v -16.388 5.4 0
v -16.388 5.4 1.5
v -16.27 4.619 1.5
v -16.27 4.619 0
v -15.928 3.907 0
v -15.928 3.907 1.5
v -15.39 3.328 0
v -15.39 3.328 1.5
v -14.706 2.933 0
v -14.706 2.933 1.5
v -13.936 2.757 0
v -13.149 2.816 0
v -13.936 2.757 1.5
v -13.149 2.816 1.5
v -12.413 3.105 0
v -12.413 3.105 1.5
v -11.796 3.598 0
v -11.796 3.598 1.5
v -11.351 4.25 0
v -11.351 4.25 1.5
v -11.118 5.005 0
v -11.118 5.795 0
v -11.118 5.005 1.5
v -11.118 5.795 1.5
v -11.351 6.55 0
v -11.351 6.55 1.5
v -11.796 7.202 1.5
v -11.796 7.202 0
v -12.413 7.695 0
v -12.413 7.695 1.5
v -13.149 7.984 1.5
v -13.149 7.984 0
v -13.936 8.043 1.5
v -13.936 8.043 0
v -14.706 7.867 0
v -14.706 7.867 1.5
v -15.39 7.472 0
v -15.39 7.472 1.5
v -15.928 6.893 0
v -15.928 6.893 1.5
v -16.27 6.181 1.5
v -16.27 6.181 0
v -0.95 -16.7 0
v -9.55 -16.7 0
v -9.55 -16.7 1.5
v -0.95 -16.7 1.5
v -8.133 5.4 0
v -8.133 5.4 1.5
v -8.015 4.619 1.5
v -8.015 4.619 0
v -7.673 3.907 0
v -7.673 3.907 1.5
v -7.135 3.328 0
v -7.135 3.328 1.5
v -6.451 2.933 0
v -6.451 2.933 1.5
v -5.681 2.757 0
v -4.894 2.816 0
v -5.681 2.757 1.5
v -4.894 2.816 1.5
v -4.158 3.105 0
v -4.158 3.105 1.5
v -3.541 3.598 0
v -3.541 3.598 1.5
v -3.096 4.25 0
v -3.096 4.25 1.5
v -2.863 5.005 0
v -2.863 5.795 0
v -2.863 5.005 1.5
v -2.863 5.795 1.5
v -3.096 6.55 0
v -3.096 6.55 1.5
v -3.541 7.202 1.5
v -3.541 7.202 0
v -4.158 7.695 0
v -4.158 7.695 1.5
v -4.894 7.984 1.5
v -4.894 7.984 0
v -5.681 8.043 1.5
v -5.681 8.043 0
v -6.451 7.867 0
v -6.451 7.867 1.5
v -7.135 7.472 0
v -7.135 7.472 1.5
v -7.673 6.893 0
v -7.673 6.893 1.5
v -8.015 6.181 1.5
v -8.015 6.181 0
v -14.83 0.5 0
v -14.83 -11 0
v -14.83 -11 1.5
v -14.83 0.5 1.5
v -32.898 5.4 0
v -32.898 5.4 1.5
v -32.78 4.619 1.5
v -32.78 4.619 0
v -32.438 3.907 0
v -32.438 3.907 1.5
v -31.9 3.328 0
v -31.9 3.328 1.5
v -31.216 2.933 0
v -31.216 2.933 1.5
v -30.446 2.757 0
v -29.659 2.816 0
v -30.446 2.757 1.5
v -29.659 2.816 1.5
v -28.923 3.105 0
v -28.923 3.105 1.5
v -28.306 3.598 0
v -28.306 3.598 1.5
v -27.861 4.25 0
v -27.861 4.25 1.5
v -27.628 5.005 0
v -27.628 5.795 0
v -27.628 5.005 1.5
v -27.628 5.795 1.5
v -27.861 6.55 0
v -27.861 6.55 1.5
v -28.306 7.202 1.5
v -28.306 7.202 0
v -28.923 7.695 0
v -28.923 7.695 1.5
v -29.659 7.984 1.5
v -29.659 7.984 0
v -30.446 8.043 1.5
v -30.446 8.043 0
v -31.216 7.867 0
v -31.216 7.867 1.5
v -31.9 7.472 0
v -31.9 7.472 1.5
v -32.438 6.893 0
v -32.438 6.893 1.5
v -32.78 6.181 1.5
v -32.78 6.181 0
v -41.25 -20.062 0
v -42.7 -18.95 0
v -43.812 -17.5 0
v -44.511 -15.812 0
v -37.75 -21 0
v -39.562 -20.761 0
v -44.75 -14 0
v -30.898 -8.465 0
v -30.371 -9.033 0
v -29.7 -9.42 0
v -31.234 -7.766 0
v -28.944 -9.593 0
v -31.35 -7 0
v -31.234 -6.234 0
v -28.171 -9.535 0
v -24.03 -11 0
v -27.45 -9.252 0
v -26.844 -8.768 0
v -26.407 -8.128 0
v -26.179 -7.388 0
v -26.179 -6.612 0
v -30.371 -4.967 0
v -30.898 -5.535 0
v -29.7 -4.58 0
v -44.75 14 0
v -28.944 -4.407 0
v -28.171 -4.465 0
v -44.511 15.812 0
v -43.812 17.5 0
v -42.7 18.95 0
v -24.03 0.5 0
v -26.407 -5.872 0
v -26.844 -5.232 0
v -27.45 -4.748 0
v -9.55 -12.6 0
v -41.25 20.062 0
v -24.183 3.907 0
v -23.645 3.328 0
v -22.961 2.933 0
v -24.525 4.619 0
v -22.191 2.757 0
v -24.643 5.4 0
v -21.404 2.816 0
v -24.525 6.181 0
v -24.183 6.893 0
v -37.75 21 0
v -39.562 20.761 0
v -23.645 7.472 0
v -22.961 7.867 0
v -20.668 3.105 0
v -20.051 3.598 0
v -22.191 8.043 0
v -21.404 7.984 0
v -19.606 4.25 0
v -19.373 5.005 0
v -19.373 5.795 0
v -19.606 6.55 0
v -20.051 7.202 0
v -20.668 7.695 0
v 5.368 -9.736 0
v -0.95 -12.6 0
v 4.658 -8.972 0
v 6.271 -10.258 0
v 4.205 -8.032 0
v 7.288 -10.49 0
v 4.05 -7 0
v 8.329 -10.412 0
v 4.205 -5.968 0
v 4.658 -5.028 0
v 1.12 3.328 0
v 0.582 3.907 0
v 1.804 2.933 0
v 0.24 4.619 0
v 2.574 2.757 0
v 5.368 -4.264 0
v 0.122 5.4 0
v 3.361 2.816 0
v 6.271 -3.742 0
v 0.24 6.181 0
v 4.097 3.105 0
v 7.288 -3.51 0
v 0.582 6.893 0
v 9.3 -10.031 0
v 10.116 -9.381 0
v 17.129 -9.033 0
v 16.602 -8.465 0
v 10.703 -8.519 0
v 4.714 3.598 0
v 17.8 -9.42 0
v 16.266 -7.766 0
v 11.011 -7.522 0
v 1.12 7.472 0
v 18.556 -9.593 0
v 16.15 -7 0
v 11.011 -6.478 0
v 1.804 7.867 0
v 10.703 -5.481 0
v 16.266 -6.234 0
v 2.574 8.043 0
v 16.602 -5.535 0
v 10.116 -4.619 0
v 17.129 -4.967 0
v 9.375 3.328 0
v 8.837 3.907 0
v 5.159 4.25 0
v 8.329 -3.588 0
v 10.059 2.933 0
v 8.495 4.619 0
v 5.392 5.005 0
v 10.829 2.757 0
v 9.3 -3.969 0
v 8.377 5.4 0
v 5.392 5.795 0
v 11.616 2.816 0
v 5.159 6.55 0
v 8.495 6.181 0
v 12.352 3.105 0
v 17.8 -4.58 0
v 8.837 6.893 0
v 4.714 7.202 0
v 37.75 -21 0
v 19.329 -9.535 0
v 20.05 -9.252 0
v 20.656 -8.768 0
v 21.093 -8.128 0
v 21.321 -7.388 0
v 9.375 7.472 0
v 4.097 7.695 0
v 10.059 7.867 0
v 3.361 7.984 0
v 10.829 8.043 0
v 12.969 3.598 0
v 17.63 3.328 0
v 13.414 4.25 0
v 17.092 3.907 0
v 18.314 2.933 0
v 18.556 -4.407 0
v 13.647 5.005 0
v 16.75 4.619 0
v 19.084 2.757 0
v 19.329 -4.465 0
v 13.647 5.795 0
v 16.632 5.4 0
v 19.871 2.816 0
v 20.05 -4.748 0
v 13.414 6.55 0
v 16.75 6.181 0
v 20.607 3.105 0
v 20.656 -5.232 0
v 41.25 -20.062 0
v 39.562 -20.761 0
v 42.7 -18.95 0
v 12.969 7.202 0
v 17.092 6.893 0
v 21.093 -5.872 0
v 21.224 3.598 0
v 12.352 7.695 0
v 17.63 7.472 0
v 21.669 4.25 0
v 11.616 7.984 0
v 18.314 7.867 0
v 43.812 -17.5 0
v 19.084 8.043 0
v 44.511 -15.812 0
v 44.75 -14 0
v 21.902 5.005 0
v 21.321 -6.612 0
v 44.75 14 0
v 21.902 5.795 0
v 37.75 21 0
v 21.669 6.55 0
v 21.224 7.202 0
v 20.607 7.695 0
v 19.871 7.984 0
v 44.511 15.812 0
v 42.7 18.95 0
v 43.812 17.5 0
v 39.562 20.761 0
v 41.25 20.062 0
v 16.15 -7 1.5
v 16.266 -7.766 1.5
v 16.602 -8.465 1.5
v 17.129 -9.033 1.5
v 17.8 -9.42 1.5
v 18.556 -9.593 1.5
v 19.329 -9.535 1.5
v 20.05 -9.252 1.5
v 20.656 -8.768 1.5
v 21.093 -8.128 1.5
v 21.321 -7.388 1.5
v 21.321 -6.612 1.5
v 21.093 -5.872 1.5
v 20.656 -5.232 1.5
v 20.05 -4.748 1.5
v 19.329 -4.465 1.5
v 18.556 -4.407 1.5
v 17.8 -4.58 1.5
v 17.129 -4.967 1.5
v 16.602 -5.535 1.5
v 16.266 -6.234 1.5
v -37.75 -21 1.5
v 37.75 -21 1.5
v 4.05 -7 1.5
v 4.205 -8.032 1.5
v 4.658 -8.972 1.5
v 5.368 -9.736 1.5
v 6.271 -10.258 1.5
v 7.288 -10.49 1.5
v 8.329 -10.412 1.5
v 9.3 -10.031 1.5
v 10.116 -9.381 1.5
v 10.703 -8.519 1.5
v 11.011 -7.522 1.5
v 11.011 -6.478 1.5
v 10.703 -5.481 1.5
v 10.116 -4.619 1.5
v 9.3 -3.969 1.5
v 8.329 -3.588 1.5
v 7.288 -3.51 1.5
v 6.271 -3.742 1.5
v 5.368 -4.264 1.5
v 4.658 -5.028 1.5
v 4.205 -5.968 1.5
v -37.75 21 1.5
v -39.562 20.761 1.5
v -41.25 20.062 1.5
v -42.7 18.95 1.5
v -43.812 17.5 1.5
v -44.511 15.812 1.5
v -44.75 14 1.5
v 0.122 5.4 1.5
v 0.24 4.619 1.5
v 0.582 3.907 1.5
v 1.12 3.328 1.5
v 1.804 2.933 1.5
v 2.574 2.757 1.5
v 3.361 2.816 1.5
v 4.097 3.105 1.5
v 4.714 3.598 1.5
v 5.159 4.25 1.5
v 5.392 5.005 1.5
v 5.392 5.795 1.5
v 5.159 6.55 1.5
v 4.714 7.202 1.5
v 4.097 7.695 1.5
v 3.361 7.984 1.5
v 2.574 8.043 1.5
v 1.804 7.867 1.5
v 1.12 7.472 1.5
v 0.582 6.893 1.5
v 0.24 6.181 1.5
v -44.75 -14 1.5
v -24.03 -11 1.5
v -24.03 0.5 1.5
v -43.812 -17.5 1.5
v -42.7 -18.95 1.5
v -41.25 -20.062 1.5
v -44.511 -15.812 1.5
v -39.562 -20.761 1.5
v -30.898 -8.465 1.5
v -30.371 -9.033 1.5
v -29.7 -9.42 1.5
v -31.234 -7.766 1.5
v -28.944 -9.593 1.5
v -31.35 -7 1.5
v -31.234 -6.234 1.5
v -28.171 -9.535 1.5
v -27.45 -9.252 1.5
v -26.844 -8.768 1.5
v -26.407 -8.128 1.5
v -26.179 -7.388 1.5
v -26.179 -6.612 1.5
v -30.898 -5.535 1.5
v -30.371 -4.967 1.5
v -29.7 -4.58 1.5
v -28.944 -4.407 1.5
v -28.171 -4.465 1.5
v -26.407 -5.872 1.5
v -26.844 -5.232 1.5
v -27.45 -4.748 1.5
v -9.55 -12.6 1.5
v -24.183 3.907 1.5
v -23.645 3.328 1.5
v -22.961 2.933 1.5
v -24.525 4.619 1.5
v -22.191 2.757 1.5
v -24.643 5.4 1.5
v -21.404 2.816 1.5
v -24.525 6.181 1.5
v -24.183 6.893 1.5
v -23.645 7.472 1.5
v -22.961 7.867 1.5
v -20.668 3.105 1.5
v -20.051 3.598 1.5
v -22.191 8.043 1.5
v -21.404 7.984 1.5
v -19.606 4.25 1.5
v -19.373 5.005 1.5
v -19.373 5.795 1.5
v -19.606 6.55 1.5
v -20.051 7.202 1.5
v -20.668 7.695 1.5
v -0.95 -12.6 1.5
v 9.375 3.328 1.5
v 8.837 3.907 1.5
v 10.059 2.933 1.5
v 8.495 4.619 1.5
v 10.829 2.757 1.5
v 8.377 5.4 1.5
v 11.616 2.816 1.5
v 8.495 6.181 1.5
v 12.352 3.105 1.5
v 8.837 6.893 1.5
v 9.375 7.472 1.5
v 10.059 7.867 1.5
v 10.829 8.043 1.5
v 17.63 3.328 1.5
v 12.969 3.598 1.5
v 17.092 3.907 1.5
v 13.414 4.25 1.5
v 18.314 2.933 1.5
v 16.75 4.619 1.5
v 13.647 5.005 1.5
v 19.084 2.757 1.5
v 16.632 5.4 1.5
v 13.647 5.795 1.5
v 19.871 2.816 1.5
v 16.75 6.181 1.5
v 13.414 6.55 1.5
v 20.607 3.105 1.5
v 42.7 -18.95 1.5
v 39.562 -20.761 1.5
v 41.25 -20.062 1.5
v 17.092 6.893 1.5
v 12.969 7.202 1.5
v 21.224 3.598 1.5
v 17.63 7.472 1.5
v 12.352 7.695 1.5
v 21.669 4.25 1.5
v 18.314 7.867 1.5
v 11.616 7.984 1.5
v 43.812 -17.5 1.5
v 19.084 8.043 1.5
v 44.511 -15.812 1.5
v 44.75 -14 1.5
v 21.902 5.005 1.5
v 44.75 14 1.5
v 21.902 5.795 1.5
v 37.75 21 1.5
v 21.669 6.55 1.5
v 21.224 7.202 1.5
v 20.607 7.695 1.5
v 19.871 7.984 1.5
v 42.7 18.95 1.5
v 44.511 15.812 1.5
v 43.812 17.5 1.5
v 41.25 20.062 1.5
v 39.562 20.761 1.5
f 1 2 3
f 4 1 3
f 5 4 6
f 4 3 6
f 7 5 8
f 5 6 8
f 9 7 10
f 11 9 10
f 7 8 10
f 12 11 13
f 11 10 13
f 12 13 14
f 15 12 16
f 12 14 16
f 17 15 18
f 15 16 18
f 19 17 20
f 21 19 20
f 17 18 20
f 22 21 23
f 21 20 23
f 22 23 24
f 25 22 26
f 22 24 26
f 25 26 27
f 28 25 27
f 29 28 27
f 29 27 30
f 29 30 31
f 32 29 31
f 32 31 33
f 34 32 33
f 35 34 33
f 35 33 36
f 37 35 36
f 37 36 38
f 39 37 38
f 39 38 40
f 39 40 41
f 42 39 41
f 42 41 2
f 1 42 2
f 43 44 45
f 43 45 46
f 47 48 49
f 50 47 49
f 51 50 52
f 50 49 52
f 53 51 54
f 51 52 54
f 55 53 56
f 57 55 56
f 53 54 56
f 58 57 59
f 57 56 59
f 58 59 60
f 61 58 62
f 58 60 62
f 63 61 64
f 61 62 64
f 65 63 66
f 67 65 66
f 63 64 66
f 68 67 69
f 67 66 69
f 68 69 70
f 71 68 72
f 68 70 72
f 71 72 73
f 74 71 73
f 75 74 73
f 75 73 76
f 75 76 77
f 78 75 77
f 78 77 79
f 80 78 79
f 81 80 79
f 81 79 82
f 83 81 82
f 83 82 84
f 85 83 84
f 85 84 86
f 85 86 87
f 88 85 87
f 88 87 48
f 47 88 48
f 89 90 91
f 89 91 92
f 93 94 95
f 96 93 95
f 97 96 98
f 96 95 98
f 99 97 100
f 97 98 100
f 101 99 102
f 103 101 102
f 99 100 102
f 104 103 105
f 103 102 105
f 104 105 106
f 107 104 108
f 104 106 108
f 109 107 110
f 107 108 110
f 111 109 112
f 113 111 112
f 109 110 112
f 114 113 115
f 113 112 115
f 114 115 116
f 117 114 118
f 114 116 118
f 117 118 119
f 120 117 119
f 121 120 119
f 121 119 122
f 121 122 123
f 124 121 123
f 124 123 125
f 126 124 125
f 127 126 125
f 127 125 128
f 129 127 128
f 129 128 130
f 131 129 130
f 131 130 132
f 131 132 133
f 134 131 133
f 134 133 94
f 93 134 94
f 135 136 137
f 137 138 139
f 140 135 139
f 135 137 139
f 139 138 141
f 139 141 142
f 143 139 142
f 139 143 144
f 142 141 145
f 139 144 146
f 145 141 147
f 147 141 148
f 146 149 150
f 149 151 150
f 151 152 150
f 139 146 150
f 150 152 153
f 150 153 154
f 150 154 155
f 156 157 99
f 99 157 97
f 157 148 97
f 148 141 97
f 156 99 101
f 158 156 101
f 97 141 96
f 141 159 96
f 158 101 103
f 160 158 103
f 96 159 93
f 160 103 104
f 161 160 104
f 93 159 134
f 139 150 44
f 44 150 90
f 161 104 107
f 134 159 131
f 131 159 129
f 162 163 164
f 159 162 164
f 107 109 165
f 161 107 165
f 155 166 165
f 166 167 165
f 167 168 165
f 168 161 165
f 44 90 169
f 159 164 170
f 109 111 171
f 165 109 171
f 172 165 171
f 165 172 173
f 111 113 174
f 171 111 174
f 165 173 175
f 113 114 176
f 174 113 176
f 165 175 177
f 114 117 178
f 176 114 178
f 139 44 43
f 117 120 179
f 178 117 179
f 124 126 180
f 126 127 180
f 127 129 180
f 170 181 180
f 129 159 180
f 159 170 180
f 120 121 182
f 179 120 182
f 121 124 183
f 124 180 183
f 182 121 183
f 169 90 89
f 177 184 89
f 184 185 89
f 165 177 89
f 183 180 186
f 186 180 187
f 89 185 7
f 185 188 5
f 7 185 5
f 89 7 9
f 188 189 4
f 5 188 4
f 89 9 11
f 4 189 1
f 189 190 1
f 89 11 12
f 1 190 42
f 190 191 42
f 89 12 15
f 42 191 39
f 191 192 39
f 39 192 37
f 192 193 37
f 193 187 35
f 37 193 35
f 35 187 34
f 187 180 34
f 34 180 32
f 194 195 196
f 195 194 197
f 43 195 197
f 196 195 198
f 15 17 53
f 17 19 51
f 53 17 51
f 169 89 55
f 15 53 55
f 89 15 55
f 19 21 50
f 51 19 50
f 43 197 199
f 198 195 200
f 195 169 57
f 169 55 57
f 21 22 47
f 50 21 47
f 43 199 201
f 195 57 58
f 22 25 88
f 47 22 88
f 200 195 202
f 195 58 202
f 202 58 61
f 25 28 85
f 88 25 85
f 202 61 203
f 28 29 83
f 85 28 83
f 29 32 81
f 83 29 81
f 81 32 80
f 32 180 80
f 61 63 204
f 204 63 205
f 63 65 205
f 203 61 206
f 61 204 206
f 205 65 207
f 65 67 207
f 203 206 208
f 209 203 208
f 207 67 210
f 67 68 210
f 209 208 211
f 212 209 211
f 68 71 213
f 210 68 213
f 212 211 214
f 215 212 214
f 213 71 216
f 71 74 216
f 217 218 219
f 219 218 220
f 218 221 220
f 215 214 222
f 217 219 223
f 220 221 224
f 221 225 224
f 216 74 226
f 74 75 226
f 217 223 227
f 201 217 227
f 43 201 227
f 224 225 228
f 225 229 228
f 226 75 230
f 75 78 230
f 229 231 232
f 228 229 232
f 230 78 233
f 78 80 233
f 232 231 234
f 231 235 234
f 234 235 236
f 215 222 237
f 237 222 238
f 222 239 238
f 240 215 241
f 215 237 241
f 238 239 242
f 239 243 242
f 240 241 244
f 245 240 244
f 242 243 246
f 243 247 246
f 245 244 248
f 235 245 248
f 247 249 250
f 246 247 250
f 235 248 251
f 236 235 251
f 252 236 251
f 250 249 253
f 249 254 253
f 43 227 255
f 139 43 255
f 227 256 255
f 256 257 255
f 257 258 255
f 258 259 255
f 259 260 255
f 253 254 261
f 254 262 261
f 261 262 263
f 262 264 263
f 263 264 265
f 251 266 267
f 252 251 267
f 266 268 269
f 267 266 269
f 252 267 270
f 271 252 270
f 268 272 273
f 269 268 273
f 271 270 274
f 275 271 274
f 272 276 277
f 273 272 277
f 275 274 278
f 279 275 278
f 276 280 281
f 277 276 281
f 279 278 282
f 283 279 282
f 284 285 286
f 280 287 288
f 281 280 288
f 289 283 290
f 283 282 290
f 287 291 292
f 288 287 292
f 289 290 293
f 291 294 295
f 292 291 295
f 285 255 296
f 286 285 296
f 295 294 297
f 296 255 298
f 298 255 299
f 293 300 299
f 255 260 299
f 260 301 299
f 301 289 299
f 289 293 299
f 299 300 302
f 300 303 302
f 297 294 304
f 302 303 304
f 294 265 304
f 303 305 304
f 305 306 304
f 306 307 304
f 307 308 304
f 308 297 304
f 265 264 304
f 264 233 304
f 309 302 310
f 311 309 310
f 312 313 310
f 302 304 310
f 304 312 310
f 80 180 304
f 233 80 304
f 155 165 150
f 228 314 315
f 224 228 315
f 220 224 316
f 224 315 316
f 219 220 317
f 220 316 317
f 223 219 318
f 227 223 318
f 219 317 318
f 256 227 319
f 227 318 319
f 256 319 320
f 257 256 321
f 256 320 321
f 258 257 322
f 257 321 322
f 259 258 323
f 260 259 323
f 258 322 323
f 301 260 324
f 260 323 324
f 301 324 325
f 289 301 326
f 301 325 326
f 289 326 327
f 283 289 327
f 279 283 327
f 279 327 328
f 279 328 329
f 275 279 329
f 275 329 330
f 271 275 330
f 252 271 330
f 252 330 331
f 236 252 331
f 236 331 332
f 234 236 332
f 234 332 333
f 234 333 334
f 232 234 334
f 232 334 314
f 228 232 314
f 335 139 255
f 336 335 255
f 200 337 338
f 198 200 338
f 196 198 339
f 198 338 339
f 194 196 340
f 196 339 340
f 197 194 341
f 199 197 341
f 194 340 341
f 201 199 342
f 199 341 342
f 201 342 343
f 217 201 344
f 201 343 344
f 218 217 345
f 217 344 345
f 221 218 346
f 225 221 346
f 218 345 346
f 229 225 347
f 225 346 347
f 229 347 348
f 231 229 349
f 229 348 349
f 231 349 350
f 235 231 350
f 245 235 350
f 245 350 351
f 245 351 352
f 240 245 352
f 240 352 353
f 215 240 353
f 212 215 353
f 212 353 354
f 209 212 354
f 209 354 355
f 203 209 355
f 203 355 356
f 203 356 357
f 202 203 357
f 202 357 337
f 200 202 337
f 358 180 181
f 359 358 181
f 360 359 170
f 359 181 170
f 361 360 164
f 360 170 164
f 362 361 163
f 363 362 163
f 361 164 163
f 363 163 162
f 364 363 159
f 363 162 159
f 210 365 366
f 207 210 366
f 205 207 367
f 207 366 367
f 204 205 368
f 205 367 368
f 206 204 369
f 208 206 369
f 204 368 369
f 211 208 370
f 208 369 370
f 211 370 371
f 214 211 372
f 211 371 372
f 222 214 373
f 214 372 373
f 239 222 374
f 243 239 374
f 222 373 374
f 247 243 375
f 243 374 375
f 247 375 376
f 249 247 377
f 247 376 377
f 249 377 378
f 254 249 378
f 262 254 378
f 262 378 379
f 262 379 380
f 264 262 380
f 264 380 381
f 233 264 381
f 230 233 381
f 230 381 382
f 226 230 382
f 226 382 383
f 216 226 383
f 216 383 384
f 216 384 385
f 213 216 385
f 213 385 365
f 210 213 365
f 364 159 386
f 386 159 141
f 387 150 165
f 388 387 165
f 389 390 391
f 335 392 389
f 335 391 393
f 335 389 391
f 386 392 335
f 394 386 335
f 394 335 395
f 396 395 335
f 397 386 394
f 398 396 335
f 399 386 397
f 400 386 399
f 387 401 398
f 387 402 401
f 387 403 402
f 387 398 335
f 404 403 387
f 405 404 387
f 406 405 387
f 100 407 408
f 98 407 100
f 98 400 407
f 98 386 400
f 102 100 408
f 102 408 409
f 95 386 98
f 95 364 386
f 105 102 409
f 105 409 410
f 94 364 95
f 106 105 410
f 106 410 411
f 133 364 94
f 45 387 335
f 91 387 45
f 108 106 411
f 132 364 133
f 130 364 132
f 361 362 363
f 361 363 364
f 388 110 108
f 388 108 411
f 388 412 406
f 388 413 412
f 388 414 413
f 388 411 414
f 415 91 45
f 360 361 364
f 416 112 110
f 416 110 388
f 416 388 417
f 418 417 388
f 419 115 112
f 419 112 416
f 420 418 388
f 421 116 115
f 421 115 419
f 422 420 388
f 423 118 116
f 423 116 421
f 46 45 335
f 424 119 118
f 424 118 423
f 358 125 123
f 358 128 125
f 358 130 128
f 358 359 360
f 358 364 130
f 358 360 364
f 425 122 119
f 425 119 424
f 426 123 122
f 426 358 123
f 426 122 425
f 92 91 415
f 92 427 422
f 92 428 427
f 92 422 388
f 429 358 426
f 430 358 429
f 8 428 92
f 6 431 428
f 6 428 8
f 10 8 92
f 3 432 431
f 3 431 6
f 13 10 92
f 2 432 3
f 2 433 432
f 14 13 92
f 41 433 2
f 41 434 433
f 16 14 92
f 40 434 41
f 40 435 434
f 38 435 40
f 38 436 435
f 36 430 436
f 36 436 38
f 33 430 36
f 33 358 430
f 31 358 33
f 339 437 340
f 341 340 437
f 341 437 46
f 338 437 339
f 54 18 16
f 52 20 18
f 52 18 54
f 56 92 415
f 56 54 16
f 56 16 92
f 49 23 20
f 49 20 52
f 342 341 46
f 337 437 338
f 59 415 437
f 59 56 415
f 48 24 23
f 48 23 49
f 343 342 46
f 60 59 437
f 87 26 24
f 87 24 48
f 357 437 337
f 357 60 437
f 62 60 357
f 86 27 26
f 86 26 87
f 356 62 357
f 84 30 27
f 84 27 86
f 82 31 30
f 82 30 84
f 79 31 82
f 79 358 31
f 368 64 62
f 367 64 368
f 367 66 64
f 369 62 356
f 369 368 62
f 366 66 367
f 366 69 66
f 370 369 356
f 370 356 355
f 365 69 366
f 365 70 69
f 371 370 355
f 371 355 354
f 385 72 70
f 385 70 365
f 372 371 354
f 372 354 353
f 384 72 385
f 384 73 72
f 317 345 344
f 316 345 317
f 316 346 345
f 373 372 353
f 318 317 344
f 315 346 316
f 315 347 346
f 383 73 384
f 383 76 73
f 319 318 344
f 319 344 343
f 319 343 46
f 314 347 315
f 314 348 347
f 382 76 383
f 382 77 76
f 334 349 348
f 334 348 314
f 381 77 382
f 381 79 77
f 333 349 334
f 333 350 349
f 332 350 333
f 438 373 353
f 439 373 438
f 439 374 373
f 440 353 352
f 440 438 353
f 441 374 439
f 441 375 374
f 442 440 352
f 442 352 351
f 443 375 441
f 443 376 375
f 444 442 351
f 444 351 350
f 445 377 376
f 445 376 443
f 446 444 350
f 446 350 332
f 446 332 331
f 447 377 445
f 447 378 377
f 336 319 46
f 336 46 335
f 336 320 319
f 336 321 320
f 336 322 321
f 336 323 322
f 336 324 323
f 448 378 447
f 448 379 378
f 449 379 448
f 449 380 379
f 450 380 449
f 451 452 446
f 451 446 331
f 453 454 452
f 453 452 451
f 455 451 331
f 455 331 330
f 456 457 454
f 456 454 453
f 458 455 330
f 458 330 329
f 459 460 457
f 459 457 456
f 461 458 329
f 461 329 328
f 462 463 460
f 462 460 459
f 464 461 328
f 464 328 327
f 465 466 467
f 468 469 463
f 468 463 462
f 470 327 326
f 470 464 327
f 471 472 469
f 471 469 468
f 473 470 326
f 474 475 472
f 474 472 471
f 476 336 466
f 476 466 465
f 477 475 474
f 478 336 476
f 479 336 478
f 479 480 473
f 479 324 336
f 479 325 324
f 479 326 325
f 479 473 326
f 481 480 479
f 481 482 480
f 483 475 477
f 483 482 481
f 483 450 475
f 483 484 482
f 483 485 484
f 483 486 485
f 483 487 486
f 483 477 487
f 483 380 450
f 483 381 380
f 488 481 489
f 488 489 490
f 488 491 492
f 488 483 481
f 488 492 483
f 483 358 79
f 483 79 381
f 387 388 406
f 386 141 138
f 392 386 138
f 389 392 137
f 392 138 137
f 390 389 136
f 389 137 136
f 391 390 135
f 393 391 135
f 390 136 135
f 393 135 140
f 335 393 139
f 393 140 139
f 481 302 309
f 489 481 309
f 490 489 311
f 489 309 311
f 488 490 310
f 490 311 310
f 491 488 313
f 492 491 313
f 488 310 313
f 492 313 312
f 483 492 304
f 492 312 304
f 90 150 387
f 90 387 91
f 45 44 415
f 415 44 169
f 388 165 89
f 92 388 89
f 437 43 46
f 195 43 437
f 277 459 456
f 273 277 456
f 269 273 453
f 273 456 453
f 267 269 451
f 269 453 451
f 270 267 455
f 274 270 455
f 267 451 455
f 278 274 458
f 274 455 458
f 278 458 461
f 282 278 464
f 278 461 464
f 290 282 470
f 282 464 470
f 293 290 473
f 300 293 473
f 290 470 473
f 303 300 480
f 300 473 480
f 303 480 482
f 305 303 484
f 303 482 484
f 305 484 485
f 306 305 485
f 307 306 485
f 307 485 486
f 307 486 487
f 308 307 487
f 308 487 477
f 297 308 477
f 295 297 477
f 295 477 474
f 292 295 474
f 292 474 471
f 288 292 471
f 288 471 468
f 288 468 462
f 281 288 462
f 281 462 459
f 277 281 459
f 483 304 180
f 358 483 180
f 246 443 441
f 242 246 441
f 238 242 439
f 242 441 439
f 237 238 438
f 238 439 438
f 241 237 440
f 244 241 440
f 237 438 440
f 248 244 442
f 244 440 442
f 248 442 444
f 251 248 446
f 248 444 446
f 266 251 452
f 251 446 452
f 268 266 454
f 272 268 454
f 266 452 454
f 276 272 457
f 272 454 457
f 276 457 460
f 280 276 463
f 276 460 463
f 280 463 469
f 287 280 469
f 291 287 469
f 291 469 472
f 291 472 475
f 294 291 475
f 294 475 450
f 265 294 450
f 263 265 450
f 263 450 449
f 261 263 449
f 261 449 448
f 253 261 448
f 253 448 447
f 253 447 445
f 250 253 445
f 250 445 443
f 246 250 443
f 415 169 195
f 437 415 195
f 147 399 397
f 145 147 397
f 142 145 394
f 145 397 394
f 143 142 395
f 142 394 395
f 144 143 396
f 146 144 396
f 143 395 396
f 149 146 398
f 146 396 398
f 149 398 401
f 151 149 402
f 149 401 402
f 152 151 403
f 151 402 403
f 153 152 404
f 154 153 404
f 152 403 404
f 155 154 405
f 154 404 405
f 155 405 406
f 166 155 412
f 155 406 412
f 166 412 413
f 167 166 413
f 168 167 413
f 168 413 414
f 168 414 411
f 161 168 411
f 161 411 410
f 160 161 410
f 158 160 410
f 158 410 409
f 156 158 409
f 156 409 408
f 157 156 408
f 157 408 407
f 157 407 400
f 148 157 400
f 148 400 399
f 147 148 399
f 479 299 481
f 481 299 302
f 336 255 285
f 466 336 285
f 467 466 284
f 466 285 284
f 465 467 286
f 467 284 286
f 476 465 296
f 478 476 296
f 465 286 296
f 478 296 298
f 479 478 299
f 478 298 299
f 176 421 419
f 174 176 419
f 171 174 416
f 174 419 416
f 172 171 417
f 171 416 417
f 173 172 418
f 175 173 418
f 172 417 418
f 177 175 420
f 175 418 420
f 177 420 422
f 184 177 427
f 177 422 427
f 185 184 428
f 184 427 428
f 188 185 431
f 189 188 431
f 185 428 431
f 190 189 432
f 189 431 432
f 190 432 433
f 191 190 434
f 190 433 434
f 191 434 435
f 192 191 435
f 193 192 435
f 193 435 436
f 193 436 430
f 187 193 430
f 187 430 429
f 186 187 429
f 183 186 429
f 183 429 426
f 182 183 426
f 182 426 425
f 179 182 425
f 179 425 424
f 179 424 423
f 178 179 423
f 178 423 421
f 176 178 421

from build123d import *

# Parameters (mm, degrees)
F0_W     = 8.6
F0_H     = 4.1
F0_W_2   = 9.2
F0_H_2   = 11.5
F1_DEPTH = 1.5
F2_D     = 5.2
F2_DEPTH = 2
F2_TIP   = 1.5622376095
F3_D     = 7
F3_DEPTH = 2
F3_TIP   = 2.1030121666
F4_D     = 5.3
F4_DEPTH = 2
F4_TIP   = 1.5922806404


# Not quite as in the source:
# - a feature names something its author has since deleted; it is built from what else it names


with BuildPart() as f1:
    # F0 (on Top) → F1 (new body)
    with BuildSketch(Plane.XY):
        with BuildLine():
            Line((-37.75, -21), (37.75, -21))
            ThreePointArc((37.75, -21), (42.6997474683, -18.9497474683), (44.75, -14))
            Line((44.75, -14), (44.75, 14))
            ThreePointArc((44.75, 14), (42.6997474683, 18.9497474683), (37.75, 21))
            Line((37.75, 21), (-37.75, 21))
            ThreePointArc((-37.75, 21), (-42.6997474683, 18.9497474683), (-44.75, 14))
            Line((-44.75, 14), (-44.75, -14))
            ThreePointArc((-44.75, -14), (-42.6997474683, -18.9497474683), (-37.75, -21))
        make_face()
        with Locations((-5.25, -14.65)):
            Rectangle(F0_W, F0_H, mode=Mode.SUBTRACT)
        with Locations((-19.43, -5.25)):
            Rectangle(F0_W_2, F0_H_2, mode=Mode.SUBTRACT)
    extrude(amount=F1_DEPTH)

    # F2
    with Locations(Plane(origin=(0, 0, 0), x_dir=(1, 0, 0), z_dir=(0, 0, -1))):
        with Locations((18.75, 7), (-28.75, 7)):
            Hole(F2_D / 2, depth=F2_DEPTH)
            with Locations((0, 0, -(F2_DEPTH + F2_TIP / 2))):  # 118° drill point
                Cone(0, F2_D / 2, F2_TIP, mode=Mode.SUBTRACT)

    # F3
    with Locations(Plane(origin=(0, 0, 0), x_dir=(1, 0, 0), z_dir=(0, 0, -1))):
        with Locations((7.55, 7)):
            Hole(F3_D / 2, depth=F3_DEPTH)
            with Locations((0, 0, -(F3_DEPTH + F3_TIP / 2))):  # 118° drill point
                Cone(0, F3_D / 2, F3_TIP, mode=Mode.SUBTRACT)

    # F4
    with Locations(Plane(origin=(0, 0, 0), x_dir=(1, 0, 0), z_dir=(0, 0, -1))):
        with Locations((-30.2482247353, -5.4), (-21.9932247353, -5.4), (-13.7382247353, -5.4), (-5.4832247353, -5.4), (2.7717752647, -5.4), (11.0267752647, -5.4), (19.2817752647, -5.4)):
            Hole(F4_D / 2, depth=F4_DEPTH)
            with Locations((0, 0, -(F4_DEPTH + F4_TIP / 2))):  # 118° drill point
                Cone(0, F4_D / 2, F4_TIP, mode=Mode.SUBTRACT)


solid = f1.part
